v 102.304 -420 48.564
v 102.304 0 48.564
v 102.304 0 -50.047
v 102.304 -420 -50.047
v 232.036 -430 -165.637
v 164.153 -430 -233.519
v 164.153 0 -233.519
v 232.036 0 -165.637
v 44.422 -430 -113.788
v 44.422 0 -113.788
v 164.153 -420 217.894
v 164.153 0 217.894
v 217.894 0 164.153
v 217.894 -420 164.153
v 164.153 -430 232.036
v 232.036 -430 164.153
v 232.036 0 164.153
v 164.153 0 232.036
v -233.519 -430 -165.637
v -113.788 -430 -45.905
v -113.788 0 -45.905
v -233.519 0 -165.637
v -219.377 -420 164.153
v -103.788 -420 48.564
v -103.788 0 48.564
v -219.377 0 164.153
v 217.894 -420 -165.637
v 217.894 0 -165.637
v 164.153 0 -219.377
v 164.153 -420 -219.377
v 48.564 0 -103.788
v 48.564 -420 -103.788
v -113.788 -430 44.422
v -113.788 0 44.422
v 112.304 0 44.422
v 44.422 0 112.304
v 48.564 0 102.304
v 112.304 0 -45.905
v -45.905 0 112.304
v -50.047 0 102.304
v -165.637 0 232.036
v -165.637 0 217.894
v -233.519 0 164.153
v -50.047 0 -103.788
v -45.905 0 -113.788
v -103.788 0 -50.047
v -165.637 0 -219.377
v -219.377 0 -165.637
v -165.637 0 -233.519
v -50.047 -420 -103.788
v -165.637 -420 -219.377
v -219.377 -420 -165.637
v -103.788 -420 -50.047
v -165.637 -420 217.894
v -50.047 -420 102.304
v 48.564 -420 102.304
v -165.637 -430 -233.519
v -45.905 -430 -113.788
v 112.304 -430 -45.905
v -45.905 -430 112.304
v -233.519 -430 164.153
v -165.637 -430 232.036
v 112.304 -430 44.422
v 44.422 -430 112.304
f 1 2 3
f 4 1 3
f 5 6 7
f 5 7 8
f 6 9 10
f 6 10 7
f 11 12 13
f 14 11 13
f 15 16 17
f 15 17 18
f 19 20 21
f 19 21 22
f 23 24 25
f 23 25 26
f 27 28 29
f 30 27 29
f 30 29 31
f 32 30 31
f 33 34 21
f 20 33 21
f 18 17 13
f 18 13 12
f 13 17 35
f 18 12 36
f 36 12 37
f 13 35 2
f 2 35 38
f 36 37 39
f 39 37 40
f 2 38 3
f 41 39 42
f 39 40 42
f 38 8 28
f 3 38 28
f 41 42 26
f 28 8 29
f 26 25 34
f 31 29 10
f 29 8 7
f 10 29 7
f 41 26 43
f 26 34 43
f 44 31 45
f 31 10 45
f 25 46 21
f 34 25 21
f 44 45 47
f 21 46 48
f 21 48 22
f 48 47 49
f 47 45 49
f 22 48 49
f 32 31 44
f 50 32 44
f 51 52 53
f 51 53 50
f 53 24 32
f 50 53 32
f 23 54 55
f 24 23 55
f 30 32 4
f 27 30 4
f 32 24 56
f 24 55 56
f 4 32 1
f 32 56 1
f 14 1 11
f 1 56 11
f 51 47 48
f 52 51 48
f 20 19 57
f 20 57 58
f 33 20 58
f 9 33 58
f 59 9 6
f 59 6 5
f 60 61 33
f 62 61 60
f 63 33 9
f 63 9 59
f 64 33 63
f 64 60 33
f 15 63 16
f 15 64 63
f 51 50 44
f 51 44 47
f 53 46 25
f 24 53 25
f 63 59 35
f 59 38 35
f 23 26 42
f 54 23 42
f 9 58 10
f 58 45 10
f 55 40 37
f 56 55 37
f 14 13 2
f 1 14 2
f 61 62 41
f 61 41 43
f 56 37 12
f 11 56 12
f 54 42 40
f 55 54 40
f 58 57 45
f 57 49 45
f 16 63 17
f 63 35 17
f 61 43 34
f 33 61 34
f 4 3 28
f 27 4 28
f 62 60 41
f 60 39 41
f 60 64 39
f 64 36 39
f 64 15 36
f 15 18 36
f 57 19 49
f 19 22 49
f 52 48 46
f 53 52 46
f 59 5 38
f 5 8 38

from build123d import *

# Parameters (mm, degrees)
BOSS_EXTRUDE1_DEPTH = 420
BOSS_EXTRUDE2_DEPTH = 10


with BuildPart() as part:
    # Sketch1 → Boss-Extrude1 (new body)
    with BuildSketch(Plane(origin=(0, 0, 0), x_dir=(1, 0, 0), z_dir=(0, 1, 0))):
        Polygon((-113.787540309, 45.905289316), (-233.518909136, 165.636658142), (-165.636658142, 233.518909136), (-45.905289316, 113.787540309), (44.422091789, 113.787540309), (164.153460615, 233.518909136), (232.035711609, 165.636658142), (112.304342783, 45.905289316), (112.304342783, -44.422091789), (232.035711609, -164.153460615), (164.153460615, -232.035711609), (44.422091789, -112.304342783), (-45.905289316, -112.304342783), (-165.636658142, -232.035711609), (-233.518909136, -164.153460615), (-113.787540309, -44.422091789), align=None)
        Polygon((-50.047424939, -102.304342783), (48.564227412, -102.304342783), (164.153460615, -217.893575985), (217.893575985, -164.153460615), (102.304342783, -48.564227412), (102.304342783, 50.047424939), (217.893575985, 165.636658142), (164.153460615, 219.376773512), (48.564227412, 103.787540309), (-50.047424939, 103.787540309), (-165.636658142, 219.376773512), (-219.376773512, 165.636658142), (-103.787540309, 50.047424939), (-103.787540309, -48.564227412), (-219.376773512, -164.153460615), (-165.636658142, -217.893575985), align=None, mode=Mode.SUBTRACT)
    extrude(amount=-BOSS_EXTRUDE1_DEPTH)

    # Sketch3 → Boss-Extrude2 (add)
    with BuildSketch(Plane.XZ.offset(420)):
        Polygon((-113.787540309, 44.422091789), (-113.787540309, -45.905289316), (-233.518909136, -165.636658142), (-165.636658142, -233.518909136), (-45.905289316, -113.787540309), (44.422091789, -113.787540309), (164.153460615, -233.518909136), (232.035711609, -165.636658142), (112.304342783, -45.905289316), (112.304342783, 44.422091789), (232.035711609, 164.153460615), (164.153460615, 232.035711609), (44.422091789, 112.304342783), (-45.905289316, 112.304342783), (-165.636658142, 232.035711609), (-233.518909136, 164.153460615), align=None)
    extrude(amount=BOSS_EXTRUDE2_DEPTH)


solid = part.part
